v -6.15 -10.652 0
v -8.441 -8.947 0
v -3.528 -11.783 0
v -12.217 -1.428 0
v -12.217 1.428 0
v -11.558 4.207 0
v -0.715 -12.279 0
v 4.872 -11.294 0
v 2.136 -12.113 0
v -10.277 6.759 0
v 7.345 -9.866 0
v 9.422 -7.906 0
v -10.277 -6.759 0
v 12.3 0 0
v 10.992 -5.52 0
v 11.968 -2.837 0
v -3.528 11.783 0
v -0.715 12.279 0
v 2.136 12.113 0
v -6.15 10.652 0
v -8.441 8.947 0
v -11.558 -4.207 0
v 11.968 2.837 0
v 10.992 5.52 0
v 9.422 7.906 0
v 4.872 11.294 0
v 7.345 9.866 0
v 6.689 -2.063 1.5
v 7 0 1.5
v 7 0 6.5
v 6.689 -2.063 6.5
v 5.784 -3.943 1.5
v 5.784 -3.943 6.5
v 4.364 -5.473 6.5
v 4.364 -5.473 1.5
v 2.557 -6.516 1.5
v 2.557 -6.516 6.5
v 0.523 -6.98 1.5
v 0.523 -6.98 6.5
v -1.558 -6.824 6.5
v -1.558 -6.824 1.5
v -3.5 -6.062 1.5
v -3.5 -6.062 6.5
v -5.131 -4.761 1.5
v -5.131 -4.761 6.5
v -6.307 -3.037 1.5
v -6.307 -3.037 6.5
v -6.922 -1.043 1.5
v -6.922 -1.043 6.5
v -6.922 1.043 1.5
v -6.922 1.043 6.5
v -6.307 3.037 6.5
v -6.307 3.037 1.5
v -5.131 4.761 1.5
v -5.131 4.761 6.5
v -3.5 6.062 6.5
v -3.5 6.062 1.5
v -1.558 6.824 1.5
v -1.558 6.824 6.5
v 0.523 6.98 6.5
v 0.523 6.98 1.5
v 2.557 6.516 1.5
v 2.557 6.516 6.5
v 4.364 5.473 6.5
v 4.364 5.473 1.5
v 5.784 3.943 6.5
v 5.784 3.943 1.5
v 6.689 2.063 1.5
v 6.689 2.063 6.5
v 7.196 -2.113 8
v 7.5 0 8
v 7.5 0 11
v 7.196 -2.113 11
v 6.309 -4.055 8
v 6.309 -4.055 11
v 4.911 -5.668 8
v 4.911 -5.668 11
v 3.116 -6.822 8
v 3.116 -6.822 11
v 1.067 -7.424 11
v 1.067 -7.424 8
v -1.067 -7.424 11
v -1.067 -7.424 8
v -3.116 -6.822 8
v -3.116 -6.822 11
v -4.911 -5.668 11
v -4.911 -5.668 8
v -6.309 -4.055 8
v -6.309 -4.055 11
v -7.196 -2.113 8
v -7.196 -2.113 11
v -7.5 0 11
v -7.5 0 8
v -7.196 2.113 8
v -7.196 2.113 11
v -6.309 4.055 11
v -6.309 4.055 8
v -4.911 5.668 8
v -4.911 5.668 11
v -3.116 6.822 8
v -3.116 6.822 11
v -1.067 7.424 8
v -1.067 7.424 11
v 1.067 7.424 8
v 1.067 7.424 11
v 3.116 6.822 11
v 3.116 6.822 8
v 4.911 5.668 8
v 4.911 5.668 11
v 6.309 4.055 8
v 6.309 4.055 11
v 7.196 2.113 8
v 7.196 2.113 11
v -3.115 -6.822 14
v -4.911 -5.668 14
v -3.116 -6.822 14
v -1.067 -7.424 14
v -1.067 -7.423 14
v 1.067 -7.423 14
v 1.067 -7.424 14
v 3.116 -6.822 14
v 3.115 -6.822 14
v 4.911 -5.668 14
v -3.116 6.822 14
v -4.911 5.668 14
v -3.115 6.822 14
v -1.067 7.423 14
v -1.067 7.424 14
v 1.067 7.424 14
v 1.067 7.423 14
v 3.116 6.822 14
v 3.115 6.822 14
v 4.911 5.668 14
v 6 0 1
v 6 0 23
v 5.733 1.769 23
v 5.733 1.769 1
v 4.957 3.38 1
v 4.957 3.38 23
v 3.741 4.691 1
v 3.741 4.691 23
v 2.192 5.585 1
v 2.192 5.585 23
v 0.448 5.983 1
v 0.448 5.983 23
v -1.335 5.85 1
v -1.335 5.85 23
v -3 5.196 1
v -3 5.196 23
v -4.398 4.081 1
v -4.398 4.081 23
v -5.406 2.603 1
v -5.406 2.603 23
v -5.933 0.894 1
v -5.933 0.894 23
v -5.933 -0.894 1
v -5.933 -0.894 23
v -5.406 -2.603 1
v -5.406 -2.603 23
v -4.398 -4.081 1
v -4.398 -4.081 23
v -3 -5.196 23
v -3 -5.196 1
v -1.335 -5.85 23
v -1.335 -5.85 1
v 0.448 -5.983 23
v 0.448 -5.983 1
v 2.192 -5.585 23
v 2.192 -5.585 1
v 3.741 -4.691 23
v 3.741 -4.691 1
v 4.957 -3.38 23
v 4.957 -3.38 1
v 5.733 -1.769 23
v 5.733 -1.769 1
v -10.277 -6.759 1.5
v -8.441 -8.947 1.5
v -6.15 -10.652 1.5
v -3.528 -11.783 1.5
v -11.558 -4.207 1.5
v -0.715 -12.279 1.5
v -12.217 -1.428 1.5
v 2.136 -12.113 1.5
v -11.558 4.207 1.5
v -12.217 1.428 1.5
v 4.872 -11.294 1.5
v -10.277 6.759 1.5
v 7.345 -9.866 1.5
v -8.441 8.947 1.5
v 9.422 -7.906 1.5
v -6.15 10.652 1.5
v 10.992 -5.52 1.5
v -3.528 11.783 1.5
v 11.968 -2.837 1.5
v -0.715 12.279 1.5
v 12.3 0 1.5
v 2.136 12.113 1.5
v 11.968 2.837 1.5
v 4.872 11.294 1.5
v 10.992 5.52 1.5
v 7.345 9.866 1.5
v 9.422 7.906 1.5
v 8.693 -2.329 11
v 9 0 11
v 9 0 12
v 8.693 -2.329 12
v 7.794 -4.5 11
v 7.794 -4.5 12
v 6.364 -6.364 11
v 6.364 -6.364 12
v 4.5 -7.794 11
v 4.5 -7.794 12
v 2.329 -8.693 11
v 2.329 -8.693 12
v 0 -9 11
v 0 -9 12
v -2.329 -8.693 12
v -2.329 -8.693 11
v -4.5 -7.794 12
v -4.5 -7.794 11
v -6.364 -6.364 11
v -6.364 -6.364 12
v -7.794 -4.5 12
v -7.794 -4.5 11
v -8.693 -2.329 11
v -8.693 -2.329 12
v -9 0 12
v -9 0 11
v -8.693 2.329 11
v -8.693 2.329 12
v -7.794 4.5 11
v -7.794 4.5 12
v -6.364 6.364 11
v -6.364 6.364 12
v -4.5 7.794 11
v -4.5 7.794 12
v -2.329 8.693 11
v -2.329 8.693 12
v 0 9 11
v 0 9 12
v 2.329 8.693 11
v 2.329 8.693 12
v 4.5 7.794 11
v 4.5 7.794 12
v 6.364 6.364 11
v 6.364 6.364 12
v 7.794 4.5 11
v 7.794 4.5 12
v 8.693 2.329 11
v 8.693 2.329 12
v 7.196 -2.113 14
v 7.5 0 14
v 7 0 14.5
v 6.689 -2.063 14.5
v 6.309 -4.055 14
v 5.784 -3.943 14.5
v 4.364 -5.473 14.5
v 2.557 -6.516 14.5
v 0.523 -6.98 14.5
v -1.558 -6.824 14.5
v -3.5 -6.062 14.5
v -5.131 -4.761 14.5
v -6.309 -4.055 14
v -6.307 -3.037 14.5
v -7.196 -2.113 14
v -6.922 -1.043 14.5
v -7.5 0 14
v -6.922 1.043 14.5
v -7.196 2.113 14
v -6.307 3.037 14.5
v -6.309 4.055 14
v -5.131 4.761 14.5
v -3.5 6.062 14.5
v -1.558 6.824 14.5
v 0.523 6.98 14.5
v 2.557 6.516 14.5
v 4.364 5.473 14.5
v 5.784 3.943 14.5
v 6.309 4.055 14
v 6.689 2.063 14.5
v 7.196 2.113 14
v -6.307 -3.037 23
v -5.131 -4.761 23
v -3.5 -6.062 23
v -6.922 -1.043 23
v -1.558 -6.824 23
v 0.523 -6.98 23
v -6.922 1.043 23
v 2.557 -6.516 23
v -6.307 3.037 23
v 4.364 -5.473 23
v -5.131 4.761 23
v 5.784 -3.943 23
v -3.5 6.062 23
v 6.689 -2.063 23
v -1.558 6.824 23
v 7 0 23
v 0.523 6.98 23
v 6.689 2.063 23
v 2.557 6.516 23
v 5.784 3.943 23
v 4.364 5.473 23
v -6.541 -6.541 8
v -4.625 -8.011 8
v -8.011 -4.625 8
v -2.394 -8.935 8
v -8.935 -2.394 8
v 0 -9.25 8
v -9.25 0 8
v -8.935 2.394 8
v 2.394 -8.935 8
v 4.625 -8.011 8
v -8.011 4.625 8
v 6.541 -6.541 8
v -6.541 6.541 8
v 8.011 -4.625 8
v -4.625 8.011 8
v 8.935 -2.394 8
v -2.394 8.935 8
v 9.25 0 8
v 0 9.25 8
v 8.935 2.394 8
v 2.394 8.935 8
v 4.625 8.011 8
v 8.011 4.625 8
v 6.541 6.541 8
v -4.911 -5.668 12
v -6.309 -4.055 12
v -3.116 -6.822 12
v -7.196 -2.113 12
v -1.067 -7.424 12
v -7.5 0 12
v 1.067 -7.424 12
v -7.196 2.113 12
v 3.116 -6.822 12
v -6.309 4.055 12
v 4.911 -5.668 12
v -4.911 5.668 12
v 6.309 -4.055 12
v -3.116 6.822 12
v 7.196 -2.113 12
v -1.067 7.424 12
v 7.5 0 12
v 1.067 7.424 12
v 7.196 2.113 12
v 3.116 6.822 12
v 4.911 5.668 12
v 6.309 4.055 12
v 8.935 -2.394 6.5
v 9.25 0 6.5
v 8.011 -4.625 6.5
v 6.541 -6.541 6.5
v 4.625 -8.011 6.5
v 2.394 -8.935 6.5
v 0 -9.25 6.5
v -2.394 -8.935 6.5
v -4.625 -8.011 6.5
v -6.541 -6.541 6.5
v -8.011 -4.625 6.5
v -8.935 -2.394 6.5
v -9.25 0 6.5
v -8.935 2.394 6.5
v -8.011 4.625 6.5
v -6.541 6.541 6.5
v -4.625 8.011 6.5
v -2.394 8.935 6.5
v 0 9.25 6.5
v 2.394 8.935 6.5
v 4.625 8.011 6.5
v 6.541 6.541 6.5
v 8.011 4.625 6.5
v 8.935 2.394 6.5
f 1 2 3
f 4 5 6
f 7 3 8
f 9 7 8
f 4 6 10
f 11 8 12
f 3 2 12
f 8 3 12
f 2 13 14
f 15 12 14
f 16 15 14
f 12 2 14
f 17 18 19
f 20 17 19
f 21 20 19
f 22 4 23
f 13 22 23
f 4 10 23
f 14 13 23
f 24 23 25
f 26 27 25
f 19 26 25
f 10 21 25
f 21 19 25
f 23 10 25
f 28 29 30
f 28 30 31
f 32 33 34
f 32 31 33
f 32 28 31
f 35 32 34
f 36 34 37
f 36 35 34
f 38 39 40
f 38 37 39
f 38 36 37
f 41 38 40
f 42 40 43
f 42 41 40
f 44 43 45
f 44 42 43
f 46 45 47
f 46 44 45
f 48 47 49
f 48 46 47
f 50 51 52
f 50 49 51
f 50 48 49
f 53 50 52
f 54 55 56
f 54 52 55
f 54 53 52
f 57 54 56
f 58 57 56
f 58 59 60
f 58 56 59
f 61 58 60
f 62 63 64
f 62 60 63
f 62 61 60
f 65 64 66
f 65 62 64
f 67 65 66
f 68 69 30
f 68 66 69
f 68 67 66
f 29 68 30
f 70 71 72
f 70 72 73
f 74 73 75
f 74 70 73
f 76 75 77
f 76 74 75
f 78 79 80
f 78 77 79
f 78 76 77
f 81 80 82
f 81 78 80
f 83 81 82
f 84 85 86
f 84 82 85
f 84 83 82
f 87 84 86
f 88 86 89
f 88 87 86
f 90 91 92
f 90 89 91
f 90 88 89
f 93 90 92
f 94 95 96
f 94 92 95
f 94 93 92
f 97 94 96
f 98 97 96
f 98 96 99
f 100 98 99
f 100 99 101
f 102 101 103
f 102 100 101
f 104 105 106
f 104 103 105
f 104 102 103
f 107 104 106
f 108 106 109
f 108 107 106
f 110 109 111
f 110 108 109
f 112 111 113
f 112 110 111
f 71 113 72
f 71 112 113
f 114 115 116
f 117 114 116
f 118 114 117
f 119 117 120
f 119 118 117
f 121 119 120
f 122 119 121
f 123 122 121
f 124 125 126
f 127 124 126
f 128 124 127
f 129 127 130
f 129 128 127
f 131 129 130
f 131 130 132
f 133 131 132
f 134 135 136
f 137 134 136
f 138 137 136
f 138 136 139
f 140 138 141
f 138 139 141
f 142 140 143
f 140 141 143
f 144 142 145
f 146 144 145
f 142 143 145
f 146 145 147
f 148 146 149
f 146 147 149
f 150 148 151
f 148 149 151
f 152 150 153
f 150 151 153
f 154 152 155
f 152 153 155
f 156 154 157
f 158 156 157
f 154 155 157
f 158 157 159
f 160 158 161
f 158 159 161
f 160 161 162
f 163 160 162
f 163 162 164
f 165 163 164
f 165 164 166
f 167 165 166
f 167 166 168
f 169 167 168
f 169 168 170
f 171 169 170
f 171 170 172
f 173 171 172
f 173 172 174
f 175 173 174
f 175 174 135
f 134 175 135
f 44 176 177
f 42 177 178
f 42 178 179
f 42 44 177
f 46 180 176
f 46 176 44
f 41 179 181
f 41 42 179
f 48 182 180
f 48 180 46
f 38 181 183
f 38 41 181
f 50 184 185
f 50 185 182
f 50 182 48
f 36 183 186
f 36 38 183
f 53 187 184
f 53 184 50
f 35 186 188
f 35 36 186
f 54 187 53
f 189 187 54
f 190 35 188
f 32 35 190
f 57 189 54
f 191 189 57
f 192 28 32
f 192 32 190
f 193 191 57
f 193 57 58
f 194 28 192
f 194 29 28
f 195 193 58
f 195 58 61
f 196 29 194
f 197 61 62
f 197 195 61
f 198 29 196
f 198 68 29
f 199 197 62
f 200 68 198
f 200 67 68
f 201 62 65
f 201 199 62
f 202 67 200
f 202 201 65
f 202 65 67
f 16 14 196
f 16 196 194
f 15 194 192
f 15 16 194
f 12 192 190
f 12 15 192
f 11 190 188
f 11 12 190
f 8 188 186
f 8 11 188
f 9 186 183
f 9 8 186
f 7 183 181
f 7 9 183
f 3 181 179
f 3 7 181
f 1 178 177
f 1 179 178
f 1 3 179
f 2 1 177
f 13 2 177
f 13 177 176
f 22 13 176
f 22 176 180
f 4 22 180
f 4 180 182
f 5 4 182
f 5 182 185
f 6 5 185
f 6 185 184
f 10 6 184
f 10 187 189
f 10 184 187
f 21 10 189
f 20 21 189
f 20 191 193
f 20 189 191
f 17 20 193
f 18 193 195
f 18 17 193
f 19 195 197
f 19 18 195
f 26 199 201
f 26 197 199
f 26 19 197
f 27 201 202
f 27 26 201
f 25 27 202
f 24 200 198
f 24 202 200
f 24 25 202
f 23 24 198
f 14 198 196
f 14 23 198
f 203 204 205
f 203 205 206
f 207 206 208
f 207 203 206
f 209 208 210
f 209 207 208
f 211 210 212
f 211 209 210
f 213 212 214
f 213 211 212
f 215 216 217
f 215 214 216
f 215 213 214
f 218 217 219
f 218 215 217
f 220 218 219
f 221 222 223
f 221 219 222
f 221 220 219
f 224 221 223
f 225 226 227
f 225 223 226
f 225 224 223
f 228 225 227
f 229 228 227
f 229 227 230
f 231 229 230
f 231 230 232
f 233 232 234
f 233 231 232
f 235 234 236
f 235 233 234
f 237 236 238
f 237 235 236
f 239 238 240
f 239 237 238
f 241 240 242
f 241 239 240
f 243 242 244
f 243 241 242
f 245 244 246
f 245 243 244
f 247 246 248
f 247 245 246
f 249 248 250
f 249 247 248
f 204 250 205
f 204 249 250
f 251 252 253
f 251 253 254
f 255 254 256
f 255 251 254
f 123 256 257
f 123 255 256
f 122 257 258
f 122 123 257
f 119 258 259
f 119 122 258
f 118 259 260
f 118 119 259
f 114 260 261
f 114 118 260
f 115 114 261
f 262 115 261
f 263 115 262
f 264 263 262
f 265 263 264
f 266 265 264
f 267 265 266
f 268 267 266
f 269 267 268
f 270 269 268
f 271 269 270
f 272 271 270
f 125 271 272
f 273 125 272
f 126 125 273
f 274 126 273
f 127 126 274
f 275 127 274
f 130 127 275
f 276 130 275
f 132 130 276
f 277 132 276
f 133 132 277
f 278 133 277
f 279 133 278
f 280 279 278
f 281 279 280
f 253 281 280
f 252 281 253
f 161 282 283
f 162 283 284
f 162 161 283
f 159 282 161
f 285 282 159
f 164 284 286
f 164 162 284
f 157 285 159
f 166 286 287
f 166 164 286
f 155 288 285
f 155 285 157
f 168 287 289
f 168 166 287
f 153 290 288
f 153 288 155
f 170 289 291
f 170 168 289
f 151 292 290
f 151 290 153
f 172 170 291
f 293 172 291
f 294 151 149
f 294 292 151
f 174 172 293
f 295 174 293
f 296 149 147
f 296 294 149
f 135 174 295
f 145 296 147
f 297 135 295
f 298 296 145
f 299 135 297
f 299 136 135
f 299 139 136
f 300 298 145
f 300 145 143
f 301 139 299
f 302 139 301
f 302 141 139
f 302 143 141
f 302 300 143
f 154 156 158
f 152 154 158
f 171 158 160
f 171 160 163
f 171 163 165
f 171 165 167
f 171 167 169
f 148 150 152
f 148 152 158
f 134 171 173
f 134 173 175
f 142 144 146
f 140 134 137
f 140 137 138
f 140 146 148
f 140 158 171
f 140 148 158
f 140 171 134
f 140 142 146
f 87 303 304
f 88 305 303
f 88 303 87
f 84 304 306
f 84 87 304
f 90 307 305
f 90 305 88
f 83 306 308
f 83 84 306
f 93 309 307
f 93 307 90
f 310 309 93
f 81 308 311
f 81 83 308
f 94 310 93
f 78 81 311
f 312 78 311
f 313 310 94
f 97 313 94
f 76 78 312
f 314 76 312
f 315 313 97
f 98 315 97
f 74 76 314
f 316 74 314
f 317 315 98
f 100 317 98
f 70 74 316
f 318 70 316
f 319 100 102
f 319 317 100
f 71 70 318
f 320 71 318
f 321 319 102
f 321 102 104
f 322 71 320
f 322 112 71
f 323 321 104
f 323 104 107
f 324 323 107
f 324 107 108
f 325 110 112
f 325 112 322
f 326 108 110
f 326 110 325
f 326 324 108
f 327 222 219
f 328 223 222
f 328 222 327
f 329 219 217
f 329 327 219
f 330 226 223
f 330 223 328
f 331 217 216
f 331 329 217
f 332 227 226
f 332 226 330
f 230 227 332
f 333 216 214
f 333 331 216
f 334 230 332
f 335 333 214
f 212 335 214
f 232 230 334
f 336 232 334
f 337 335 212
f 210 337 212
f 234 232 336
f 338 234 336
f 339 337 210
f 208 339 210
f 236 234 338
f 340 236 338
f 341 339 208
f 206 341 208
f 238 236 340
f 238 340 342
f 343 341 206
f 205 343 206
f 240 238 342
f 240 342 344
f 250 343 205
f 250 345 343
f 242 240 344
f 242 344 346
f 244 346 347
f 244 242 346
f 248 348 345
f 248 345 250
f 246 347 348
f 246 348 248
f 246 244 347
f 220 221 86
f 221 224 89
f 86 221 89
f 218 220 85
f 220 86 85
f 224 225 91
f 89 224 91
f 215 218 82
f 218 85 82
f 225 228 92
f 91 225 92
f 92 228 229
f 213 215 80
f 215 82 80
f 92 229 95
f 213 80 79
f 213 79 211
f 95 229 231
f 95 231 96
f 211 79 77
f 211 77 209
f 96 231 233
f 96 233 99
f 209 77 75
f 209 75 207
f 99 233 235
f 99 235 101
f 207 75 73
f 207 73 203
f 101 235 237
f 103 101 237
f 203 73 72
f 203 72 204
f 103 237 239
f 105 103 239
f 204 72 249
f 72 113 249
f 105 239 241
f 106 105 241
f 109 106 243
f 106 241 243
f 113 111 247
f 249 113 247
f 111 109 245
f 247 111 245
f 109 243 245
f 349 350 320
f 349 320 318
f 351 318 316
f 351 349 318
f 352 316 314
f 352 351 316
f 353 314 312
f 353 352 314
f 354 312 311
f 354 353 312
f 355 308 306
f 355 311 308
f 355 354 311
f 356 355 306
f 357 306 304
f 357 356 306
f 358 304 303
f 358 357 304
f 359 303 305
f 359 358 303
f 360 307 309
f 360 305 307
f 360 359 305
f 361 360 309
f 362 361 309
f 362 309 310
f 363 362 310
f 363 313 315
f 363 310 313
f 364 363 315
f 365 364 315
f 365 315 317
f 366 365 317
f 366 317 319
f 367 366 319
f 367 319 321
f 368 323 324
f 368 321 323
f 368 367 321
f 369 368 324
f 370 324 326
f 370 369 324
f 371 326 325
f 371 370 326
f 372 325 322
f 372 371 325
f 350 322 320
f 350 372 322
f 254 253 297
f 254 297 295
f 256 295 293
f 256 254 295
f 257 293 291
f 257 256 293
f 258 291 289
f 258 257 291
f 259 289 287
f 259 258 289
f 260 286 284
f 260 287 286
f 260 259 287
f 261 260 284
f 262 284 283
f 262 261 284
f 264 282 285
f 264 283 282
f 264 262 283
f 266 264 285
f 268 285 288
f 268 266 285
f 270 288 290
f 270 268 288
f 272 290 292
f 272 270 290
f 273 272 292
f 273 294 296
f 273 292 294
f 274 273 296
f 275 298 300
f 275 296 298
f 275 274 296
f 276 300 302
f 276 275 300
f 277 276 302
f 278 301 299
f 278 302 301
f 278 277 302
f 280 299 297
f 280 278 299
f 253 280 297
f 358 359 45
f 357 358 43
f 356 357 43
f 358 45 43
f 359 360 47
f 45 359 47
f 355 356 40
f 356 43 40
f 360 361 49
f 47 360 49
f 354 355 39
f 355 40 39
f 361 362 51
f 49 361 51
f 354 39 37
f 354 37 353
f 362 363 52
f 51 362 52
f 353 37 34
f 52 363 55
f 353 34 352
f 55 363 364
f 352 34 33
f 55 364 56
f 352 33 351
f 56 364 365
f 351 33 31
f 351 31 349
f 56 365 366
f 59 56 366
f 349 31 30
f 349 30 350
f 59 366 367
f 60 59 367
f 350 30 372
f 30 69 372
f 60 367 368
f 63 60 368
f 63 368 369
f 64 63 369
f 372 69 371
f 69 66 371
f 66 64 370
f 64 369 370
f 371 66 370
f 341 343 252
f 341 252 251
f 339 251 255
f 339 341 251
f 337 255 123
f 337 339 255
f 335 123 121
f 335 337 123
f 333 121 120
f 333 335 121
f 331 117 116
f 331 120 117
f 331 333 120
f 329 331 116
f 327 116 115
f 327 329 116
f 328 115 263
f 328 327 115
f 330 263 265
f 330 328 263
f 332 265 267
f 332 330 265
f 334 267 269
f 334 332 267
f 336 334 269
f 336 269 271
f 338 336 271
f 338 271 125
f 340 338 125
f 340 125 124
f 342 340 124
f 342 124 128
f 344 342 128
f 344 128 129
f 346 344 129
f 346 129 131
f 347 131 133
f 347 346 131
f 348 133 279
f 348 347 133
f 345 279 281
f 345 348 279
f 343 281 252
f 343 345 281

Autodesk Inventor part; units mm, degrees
ref_plane "YZ Plane" through (0, 0, 0) normal (1, 0, 0) x (0, 1, 0)
ref_plane "XZ Plane" through (0, 0, 0) normal (0, 1, 0) x (-1, 0, 0)
ref_plane "XY Plane" through (0, 0, 0) normal (0, 0, 1) x (1, 0, 0)
sketch "Esboço1" plane through (0, 0, 0) normal (0, 0, 1) x (1, 0, 0)
  circle A0 centre (0, 0) radius 12.3
  dimension "d0" = 24.6
extrude "Extrusão1" add sketch "Esboço1" along normal blind 1.5
sketch "Esboço2" plane through (0, 0, 1.5) normal (0, 0, 1) x (1, 0, 0)
  circle A0 centre (0, 0) radius 7
  dimension "d3" = 14
extrude "Extrusão2" add sketch "Esboço2" along normal blind 5
sketch "Esboço3" plane through (0, 0, 6.5) normal (0, 0, 1) x (1, 0, 0)
  circle A0 centre (0, 0) radius 9.25
  dimension "d6" = 18.5
extrude "Extrusão3" add sketch "Esboço3" along normal blind 1.5
sketch "Esboço4" plane through (0, 0, 8) normal (0, 0, 1) x (1, 0, 0)
  circle A0 centre (0, 0) radius 7.5
  dimension "d9" = 15
extrude "Extrusão4" add sketch "Esboço4" along normal blind 3
sketch "Esboço5" plane through (0, 0, 11) normal (0, 0, 1) x (1, 0, 0)
  circle A0 centre (0, 0) radius 9
  dimension "d12" = 18
extrude "Extrusão5" add sketch "Esboço5" along normal blind 1
sketch "Esboço6" plane through (0, 0, 12) normal (0, 0, 1) x (1, 0, 0)
  circle A0 centre (0, 0) radius 7.5
  dimension "d15" = 15
extrude "Extrusão6" add sketch "Esboço6" along normal blind 2
sketch "Esboço7" plane through (0, 0, 14) normal (0, 0, 1) x (1, 0, 0)
  circle A0 centre (0, 0) radius 7
  dimension "d18" = 14
extrude "Extrusão7" add sketch "Esboço7" along normal blind 9
chamfer "Chanfro1" distance 0.5 angle 45 1 edges at (-7, 0, 14)
sketch "Esboço8" plane through (0, 0, 23) normal (0, 0, 1) x (1, 0, 0)
  circle A0 centre (0, 0) radius 6
  dimension "d24" = 12
extrude "Extrusão8" cut sketch "Esboço8" against normal blind 22
properties part number "BOTÃO"
